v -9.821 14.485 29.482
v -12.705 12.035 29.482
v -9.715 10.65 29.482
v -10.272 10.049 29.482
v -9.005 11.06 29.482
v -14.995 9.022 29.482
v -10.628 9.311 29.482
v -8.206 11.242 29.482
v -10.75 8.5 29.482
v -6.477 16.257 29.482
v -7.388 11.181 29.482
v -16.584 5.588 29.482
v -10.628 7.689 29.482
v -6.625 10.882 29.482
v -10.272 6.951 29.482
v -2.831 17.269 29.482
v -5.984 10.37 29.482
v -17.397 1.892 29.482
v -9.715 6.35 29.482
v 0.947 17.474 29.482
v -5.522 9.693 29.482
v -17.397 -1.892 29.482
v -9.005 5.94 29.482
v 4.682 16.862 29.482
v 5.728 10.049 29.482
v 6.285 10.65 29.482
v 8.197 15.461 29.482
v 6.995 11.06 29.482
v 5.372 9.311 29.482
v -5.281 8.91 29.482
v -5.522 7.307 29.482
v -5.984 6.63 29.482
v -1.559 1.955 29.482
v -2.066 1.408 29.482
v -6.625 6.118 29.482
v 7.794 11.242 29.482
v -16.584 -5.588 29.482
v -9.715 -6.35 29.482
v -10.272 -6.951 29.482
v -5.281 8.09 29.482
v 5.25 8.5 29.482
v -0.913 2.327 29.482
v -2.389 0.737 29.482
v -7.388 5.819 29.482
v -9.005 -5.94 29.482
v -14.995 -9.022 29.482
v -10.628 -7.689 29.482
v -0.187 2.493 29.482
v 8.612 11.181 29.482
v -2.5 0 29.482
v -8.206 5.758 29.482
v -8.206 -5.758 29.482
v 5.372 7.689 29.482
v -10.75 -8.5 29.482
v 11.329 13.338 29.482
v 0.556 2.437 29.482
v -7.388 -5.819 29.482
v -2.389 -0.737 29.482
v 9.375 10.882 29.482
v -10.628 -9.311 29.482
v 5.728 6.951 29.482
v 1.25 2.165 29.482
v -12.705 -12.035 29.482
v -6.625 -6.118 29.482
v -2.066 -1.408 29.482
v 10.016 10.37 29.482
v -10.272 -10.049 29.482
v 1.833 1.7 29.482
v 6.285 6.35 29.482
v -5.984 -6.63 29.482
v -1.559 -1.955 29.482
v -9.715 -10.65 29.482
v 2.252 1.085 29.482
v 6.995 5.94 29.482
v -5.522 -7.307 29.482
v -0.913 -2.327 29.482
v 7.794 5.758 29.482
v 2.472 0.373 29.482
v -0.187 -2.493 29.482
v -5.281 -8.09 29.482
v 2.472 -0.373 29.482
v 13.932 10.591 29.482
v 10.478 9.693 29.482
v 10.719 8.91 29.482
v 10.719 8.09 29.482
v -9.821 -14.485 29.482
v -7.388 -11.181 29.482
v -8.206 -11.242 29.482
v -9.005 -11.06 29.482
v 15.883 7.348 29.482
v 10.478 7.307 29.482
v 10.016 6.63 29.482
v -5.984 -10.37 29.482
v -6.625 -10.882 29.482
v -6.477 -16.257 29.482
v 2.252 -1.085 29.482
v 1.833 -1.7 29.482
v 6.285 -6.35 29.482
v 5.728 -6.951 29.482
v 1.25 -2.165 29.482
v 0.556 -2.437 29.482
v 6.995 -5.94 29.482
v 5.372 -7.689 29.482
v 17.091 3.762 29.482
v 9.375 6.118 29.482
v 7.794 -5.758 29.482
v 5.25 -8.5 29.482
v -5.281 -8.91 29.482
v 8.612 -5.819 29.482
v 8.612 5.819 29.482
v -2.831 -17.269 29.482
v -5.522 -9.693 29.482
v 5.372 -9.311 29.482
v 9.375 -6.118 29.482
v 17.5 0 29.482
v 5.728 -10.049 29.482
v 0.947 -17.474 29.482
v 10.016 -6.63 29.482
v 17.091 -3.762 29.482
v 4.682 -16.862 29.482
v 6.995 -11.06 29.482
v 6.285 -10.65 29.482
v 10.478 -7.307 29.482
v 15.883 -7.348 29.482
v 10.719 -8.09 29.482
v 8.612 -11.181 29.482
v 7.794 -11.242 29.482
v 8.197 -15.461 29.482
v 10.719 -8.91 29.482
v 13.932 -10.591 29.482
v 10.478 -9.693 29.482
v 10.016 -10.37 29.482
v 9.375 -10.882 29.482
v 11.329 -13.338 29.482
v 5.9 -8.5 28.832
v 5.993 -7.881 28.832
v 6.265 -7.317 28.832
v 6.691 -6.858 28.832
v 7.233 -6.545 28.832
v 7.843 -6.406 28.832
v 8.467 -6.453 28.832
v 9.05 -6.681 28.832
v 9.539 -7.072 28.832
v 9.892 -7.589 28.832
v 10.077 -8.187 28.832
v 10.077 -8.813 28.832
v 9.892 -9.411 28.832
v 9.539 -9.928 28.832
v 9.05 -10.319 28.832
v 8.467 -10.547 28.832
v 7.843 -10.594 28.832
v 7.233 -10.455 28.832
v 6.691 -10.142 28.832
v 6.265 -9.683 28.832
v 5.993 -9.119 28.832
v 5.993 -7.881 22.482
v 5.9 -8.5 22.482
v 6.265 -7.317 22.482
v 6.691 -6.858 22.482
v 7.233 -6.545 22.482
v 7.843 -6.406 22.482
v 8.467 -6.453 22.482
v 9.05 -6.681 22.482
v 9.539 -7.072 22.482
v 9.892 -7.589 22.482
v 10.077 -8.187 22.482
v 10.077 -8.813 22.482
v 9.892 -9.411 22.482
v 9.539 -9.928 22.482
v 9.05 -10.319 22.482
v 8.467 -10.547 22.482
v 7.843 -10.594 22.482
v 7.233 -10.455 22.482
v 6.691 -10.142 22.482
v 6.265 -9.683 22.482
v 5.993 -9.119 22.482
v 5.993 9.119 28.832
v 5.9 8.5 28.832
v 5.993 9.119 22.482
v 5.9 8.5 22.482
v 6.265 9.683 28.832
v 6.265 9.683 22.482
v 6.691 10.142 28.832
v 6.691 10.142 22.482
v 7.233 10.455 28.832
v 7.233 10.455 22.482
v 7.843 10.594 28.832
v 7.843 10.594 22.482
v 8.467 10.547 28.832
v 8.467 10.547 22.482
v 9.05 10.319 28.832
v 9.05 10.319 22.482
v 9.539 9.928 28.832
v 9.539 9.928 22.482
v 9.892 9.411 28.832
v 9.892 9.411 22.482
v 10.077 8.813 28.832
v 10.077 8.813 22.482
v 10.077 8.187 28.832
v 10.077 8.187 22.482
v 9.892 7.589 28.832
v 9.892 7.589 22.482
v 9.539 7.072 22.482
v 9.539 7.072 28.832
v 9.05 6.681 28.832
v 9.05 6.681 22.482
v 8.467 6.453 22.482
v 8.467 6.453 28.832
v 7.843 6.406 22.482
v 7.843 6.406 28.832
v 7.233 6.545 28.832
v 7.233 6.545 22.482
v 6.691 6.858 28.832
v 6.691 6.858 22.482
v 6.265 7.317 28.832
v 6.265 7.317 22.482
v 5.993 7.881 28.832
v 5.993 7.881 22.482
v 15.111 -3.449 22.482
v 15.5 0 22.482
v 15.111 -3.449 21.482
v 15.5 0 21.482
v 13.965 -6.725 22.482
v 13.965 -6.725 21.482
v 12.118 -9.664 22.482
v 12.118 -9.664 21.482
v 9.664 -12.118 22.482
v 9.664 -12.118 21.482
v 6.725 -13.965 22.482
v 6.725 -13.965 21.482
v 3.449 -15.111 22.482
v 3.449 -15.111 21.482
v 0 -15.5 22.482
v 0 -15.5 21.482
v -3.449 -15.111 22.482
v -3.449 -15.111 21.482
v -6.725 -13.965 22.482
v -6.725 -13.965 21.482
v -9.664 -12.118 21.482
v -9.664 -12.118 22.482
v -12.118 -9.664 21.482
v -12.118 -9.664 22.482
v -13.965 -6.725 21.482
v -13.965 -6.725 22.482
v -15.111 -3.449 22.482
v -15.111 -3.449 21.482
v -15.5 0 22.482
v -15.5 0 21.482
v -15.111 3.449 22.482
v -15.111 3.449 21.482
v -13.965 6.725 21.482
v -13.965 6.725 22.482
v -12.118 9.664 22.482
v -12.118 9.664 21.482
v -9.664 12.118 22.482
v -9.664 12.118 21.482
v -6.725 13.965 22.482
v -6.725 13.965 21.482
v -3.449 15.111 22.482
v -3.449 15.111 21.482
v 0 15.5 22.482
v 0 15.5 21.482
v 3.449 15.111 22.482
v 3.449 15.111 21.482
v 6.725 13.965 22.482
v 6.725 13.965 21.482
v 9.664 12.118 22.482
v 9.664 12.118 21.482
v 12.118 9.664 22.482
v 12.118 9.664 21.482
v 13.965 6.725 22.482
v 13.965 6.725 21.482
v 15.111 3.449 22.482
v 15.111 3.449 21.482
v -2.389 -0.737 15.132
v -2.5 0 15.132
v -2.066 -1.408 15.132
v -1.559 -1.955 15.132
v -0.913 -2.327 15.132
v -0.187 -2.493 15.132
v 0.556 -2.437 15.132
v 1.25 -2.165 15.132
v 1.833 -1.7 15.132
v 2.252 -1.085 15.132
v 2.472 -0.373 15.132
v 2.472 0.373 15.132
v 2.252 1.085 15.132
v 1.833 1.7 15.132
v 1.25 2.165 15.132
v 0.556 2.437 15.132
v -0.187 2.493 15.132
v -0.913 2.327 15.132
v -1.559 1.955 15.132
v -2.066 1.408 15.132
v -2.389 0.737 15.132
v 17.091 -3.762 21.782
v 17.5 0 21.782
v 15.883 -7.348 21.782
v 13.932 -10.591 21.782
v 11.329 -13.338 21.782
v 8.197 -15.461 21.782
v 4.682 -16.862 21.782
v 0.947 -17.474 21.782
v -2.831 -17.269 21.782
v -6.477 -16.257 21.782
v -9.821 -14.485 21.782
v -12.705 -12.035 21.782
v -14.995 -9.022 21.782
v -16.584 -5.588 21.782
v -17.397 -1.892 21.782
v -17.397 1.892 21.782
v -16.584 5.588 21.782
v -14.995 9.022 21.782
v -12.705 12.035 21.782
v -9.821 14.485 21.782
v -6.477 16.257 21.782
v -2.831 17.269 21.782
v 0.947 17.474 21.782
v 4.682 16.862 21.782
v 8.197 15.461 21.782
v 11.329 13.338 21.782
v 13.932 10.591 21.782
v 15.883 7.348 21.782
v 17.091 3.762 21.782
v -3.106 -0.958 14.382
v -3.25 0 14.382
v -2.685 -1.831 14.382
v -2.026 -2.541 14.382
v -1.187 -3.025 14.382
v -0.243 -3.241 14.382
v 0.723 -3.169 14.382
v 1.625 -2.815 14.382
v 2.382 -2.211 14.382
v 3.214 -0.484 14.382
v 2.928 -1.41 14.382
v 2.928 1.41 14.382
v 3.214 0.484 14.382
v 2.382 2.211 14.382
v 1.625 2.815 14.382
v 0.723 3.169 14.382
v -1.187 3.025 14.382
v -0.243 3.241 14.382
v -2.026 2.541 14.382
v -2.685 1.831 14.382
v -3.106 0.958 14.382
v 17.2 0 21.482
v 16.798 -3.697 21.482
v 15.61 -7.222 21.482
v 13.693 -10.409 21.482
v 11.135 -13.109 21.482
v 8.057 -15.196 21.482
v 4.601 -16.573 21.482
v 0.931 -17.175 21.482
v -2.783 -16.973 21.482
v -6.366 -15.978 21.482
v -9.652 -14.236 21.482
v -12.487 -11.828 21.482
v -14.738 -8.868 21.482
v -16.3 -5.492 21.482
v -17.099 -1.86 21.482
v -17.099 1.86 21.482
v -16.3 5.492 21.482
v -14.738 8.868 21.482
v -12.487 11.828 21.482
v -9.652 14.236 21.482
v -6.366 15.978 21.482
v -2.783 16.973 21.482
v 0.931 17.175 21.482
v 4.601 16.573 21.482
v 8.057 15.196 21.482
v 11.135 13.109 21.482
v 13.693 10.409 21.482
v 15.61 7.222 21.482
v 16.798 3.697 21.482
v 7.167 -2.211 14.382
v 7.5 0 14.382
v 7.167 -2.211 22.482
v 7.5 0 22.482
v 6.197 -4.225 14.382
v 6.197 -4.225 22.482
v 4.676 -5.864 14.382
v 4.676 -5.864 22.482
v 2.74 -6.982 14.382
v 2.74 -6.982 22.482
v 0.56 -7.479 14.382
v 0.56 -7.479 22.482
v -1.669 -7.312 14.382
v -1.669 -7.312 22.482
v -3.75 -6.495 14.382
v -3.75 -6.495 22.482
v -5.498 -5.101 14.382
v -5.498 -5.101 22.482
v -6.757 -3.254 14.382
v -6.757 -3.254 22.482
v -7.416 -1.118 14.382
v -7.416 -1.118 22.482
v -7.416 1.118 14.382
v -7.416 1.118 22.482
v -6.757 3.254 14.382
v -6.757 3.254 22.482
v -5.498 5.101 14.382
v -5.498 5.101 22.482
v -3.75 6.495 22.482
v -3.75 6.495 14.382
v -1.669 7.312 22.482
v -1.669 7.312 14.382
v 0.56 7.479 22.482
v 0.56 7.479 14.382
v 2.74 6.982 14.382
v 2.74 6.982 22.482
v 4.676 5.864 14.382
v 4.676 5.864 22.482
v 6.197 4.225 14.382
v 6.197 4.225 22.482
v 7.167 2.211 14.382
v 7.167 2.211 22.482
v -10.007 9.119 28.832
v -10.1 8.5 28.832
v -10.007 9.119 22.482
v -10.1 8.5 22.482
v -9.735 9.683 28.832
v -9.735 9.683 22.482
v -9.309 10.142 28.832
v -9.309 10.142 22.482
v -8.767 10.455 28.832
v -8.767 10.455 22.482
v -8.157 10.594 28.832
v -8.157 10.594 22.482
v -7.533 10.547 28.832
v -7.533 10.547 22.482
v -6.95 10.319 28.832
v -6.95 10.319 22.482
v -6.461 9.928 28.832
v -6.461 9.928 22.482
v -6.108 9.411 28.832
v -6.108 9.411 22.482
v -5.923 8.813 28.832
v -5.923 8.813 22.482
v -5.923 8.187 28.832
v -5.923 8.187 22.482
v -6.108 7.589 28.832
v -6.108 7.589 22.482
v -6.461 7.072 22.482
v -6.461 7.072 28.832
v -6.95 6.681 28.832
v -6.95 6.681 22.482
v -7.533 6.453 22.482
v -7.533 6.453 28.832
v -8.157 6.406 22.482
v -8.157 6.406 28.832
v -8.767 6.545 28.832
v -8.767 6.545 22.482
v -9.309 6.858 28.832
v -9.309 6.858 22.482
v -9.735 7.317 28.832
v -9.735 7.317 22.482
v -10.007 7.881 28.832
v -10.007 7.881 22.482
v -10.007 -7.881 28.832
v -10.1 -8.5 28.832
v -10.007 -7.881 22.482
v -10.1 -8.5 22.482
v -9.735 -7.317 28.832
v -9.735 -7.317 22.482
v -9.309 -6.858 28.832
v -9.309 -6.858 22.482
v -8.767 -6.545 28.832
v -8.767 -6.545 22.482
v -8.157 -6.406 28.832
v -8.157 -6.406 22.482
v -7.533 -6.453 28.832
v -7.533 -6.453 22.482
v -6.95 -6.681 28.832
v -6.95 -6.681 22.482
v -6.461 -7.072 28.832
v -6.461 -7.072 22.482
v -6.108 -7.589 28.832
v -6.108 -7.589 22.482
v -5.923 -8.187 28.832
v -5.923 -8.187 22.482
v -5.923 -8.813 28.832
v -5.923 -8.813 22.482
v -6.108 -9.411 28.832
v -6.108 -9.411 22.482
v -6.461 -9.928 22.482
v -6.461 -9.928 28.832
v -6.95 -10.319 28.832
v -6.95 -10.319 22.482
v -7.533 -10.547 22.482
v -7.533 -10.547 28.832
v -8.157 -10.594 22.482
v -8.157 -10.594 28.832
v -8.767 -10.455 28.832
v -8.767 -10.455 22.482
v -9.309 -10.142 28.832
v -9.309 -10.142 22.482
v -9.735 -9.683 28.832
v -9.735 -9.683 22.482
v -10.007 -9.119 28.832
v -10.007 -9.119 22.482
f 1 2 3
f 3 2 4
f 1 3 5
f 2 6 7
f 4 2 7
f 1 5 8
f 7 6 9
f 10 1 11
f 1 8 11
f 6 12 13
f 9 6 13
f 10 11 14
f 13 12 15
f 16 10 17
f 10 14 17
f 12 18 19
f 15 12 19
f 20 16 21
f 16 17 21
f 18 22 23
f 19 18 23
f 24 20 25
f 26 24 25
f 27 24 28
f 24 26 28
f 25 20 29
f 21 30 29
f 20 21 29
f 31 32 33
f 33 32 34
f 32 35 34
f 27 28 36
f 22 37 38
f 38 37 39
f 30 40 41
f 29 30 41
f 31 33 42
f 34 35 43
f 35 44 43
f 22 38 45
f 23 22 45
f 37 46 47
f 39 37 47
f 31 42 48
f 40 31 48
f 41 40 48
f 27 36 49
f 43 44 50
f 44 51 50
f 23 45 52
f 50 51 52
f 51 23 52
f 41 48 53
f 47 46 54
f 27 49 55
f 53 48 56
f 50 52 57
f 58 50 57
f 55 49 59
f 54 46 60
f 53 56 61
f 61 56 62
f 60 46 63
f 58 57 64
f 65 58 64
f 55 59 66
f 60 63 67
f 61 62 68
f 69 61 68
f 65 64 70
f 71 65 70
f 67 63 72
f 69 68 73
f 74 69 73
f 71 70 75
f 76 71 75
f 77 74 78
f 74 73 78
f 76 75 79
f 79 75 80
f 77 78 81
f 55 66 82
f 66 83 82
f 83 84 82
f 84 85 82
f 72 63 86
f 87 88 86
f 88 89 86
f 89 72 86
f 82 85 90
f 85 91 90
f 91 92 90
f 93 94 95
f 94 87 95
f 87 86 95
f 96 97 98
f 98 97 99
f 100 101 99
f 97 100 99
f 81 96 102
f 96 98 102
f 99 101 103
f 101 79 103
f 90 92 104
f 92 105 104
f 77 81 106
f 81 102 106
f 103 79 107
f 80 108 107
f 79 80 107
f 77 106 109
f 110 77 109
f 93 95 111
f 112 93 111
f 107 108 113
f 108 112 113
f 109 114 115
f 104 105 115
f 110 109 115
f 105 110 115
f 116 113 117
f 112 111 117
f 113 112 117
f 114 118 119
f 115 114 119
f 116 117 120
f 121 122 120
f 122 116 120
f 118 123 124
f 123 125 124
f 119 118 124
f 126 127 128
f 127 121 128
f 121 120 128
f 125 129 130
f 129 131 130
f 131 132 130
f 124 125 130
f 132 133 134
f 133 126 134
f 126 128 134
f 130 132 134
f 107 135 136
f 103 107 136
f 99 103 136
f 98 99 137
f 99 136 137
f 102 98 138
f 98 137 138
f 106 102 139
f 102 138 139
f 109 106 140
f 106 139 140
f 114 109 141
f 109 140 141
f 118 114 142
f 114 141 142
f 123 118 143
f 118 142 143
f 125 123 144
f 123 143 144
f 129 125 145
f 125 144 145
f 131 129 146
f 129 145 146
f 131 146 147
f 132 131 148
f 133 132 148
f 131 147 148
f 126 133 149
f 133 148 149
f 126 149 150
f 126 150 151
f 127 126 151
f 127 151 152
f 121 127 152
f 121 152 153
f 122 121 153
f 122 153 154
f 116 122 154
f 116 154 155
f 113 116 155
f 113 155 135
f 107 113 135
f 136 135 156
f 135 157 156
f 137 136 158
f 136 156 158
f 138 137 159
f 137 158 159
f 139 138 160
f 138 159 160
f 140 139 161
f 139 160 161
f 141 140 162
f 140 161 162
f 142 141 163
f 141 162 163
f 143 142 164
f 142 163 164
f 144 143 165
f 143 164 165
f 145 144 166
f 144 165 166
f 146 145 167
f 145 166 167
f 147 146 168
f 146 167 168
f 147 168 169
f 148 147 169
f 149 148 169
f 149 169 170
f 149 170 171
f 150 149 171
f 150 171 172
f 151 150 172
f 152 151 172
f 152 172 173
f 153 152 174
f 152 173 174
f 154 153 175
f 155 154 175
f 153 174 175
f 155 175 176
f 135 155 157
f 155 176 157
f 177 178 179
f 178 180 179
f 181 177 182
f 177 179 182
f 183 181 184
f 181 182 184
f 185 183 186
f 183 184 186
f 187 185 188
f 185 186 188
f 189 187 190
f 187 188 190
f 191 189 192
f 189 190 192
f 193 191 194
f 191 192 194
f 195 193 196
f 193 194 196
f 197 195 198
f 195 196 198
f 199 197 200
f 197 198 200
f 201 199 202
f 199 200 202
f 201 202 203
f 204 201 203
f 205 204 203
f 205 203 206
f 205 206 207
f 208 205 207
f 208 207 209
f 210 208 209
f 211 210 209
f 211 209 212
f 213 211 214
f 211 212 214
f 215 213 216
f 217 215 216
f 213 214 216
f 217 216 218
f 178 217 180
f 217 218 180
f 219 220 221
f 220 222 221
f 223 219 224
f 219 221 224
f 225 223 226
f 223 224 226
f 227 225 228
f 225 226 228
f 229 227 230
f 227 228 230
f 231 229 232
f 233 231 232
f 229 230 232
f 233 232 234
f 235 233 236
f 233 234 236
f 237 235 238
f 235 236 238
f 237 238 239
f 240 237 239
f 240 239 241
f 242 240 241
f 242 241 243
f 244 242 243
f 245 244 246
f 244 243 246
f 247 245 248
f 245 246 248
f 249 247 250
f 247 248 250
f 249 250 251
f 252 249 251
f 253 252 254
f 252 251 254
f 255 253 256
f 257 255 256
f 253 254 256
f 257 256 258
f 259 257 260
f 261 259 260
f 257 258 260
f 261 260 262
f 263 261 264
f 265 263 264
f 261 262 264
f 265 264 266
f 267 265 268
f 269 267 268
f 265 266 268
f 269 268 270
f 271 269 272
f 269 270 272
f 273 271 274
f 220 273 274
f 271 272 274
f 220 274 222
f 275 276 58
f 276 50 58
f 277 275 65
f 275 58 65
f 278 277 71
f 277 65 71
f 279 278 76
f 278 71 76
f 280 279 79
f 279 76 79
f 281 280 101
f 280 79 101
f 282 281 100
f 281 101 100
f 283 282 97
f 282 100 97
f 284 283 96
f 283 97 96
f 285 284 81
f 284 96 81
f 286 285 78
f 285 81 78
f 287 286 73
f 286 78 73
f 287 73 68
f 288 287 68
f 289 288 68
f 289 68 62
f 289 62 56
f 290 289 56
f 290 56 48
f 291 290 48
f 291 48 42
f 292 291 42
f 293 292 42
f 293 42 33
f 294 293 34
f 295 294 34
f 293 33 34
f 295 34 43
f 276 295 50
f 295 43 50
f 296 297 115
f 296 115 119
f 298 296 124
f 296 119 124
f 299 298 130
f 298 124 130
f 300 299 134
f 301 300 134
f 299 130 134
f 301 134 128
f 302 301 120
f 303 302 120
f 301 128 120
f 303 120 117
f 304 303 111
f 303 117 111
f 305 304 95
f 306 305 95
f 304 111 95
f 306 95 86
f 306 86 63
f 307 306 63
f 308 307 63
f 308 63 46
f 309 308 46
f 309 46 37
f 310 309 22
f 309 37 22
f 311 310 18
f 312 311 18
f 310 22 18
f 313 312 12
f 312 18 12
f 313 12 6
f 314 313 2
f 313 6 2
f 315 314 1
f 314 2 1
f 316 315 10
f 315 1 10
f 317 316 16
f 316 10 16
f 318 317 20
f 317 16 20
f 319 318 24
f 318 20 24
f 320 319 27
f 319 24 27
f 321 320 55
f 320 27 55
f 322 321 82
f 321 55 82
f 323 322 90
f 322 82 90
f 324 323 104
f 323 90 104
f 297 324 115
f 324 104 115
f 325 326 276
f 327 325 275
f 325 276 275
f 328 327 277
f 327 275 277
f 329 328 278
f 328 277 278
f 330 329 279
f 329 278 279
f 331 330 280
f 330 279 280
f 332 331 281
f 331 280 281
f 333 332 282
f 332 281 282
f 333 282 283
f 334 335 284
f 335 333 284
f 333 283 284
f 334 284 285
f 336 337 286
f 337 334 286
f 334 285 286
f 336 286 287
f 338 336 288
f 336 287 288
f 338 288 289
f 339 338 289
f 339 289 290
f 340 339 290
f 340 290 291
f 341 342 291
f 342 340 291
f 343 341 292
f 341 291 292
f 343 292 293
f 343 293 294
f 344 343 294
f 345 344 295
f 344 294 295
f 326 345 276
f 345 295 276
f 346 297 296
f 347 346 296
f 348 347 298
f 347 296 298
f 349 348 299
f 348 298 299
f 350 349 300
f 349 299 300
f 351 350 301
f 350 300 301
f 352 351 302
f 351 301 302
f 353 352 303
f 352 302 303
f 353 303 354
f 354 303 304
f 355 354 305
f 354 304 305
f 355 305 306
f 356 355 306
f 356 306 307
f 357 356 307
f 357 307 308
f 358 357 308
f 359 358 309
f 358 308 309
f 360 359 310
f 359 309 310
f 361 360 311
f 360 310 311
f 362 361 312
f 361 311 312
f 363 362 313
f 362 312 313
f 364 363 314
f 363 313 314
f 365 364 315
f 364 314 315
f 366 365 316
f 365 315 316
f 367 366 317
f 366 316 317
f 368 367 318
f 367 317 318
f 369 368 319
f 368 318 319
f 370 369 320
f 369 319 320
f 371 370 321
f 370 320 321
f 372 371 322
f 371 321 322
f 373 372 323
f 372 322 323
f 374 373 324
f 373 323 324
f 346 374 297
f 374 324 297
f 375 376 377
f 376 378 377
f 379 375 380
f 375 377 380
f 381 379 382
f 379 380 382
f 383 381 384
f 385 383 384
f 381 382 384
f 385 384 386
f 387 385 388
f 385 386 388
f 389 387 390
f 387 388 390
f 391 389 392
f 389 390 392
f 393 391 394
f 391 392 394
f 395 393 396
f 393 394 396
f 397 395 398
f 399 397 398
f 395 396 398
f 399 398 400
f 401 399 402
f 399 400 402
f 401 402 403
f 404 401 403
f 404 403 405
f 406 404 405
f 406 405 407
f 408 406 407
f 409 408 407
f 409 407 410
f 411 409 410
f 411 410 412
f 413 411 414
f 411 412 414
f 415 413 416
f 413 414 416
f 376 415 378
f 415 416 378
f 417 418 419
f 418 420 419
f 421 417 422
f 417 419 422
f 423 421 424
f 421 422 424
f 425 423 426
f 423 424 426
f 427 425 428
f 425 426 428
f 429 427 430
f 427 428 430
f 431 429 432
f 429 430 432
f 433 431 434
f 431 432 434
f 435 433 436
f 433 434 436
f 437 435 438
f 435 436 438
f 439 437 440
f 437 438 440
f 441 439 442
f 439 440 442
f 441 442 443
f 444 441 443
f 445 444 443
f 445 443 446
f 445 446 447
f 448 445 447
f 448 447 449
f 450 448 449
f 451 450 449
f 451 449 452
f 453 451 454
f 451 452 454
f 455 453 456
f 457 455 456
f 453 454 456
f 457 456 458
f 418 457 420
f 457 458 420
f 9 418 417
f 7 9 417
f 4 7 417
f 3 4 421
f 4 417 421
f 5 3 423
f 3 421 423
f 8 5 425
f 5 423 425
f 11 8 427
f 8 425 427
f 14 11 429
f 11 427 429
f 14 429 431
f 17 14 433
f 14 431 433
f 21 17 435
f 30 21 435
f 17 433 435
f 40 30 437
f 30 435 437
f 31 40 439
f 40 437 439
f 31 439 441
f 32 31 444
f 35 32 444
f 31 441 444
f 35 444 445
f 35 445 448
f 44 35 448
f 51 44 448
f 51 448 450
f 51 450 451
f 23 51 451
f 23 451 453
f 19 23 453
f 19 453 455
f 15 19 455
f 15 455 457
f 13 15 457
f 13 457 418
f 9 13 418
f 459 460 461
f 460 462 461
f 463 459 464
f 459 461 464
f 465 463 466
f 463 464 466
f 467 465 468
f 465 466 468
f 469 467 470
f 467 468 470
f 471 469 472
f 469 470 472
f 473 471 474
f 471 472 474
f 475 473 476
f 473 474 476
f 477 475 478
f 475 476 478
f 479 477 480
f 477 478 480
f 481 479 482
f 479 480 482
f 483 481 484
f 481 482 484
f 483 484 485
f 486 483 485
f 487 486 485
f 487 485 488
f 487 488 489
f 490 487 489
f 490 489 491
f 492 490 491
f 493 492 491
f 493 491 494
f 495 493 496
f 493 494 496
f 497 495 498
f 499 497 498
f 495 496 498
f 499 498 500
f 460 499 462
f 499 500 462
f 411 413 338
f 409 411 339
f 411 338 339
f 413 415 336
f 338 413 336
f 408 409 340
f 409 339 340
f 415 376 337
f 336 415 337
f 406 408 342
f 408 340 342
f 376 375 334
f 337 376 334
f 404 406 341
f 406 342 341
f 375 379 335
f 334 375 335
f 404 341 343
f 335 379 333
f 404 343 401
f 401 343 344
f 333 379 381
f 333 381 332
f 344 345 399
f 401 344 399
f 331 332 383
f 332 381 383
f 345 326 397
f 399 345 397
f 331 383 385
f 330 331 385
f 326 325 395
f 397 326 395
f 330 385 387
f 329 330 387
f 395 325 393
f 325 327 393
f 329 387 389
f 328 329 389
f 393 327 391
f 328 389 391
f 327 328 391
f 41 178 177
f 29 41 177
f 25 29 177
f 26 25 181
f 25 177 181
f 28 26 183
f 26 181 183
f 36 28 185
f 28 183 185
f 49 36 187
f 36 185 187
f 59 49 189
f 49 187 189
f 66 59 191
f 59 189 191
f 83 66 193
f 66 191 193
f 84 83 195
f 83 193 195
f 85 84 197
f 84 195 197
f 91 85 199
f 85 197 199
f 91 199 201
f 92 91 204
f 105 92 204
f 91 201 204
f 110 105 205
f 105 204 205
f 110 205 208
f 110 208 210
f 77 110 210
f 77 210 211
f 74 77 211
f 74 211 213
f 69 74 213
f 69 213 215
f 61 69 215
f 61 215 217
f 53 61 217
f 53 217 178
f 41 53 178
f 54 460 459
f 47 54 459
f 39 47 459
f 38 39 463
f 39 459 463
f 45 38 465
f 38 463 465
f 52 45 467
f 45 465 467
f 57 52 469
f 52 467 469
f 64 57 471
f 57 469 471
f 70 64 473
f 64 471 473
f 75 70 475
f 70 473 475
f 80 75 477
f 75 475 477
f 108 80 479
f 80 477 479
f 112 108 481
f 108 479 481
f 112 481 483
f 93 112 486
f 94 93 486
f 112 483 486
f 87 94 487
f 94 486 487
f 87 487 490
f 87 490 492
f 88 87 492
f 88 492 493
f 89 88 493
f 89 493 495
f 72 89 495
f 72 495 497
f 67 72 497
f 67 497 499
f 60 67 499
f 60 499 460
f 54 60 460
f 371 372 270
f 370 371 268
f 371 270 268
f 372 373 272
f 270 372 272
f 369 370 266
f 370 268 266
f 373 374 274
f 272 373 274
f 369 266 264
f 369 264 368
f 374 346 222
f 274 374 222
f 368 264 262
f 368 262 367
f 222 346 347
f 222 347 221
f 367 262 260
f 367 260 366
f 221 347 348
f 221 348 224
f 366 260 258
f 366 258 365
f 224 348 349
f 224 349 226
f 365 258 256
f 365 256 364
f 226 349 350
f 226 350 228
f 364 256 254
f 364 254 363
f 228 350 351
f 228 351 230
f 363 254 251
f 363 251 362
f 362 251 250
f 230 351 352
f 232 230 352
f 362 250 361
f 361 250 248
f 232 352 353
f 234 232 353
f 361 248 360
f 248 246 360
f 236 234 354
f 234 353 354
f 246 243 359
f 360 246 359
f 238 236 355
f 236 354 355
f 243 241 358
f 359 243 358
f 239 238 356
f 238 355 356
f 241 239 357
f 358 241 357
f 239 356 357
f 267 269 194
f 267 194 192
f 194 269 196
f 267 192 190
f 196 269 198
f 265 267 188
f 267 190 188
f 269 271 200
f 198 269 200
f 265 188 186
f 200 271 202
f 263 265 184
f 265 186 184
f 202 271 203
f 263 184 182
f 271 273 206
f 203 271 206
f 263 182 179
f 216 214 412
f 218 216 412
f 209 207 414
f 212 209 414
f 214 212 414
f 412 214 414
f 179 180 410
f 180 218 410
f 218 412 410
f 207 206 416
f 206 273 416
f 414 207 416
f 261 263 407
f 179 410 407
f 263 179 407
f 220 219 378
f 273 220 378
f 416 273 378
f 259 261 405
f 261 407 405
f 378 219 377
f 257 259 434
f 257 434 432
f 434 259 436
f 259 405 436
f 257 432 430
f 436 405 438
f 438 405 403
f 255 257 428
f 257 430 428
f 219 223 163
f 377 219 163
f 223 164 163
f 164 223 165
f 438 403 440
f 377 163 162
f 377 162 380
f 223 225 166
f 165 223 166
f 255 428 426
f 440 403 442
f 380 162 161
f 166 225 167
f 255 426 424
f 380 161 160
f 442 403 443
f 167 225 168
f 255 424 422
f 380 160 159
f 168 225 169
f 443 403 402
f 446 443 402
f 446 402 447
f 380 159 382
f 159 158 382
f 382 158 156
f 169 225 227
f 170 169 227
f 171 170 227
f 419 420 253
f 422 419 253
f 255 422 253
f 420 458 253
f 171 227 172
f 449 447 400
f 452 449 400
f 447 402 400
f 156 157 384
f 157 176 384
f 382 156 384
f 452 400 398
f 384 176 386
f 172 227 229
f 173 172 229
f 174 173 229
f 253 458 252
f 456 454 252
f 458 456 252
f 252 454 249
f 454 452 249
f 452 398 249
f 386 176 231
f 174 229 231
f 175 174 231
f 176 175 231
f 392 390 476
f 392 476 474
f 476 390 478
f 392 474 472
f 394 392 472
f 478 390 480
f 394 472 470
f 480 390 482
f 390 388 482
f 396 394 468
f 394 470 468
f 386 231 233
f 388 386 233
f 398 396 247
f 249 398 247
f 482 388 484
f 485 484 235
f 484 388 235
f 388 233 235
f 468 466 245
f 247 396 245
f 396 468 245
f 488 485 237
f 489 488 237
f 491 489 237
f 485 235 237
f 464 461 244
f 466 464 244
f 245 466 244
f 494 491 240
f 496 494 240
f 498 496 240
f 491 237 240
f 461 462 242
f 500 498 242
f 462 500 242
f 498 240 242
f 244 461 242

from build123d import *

# Parameters (mm, degrees)
F3_D           = 4.2
F3_CSINK_D     = 5.5
F3_CSINK_ANGLE = 90
F5_D           = 5
F5_CSINK_D     = 6.5
F5_CSINK_ANGLE = 90
F6_SIZE        = 0.3


with BuildPart() as f1:
    # F0 (on Front) → F1 (revolve)
    with BuildSketch(Plane.XZ):
        Polygon((17.5, 29.481971), (0, 29.481971), (0, 14.381971), (7.5, 14.381971), (7.5, 22.481971), (15.5, 22.481971), (15.5, 21.481971), (17.5, 21.481971), align=None)
    revolve(axis=Axis((0, 0, 21.931971), (0, 0, -1)))

    # F3 (through all)
    with Locations(Plane.XY.offset(29.481971)):
        with Locations((-8, 8.5), (8, 8.5), (8, -8.5), (-8, -8.5)):
            CounterSinkHole(F3_D / 2, F3_CSINK_D / 2, counter_sink_angle=F3_CSINK_ANGLE)

    # F5 (through all)
    with Locations(Plane(origin=(0, 0, 14.381971), x_dir=(1, 0, 0), z_dir=(0, 0, -1))):
        with Locations((0, 0)):
            CounterSinkHole(F5_D / 2, F5_CSINK_D / 2, counter_sink_angle=F5_CSINK_ANGLE)

    # F6
    f6_edges = [f1.edges().sort_by_distance(p)[0] for p in [
        (-17.5, 0, 21.481971),
    ]]
    chamfer(f6_edges, length=F6_SIZE)


solid = f1.part
